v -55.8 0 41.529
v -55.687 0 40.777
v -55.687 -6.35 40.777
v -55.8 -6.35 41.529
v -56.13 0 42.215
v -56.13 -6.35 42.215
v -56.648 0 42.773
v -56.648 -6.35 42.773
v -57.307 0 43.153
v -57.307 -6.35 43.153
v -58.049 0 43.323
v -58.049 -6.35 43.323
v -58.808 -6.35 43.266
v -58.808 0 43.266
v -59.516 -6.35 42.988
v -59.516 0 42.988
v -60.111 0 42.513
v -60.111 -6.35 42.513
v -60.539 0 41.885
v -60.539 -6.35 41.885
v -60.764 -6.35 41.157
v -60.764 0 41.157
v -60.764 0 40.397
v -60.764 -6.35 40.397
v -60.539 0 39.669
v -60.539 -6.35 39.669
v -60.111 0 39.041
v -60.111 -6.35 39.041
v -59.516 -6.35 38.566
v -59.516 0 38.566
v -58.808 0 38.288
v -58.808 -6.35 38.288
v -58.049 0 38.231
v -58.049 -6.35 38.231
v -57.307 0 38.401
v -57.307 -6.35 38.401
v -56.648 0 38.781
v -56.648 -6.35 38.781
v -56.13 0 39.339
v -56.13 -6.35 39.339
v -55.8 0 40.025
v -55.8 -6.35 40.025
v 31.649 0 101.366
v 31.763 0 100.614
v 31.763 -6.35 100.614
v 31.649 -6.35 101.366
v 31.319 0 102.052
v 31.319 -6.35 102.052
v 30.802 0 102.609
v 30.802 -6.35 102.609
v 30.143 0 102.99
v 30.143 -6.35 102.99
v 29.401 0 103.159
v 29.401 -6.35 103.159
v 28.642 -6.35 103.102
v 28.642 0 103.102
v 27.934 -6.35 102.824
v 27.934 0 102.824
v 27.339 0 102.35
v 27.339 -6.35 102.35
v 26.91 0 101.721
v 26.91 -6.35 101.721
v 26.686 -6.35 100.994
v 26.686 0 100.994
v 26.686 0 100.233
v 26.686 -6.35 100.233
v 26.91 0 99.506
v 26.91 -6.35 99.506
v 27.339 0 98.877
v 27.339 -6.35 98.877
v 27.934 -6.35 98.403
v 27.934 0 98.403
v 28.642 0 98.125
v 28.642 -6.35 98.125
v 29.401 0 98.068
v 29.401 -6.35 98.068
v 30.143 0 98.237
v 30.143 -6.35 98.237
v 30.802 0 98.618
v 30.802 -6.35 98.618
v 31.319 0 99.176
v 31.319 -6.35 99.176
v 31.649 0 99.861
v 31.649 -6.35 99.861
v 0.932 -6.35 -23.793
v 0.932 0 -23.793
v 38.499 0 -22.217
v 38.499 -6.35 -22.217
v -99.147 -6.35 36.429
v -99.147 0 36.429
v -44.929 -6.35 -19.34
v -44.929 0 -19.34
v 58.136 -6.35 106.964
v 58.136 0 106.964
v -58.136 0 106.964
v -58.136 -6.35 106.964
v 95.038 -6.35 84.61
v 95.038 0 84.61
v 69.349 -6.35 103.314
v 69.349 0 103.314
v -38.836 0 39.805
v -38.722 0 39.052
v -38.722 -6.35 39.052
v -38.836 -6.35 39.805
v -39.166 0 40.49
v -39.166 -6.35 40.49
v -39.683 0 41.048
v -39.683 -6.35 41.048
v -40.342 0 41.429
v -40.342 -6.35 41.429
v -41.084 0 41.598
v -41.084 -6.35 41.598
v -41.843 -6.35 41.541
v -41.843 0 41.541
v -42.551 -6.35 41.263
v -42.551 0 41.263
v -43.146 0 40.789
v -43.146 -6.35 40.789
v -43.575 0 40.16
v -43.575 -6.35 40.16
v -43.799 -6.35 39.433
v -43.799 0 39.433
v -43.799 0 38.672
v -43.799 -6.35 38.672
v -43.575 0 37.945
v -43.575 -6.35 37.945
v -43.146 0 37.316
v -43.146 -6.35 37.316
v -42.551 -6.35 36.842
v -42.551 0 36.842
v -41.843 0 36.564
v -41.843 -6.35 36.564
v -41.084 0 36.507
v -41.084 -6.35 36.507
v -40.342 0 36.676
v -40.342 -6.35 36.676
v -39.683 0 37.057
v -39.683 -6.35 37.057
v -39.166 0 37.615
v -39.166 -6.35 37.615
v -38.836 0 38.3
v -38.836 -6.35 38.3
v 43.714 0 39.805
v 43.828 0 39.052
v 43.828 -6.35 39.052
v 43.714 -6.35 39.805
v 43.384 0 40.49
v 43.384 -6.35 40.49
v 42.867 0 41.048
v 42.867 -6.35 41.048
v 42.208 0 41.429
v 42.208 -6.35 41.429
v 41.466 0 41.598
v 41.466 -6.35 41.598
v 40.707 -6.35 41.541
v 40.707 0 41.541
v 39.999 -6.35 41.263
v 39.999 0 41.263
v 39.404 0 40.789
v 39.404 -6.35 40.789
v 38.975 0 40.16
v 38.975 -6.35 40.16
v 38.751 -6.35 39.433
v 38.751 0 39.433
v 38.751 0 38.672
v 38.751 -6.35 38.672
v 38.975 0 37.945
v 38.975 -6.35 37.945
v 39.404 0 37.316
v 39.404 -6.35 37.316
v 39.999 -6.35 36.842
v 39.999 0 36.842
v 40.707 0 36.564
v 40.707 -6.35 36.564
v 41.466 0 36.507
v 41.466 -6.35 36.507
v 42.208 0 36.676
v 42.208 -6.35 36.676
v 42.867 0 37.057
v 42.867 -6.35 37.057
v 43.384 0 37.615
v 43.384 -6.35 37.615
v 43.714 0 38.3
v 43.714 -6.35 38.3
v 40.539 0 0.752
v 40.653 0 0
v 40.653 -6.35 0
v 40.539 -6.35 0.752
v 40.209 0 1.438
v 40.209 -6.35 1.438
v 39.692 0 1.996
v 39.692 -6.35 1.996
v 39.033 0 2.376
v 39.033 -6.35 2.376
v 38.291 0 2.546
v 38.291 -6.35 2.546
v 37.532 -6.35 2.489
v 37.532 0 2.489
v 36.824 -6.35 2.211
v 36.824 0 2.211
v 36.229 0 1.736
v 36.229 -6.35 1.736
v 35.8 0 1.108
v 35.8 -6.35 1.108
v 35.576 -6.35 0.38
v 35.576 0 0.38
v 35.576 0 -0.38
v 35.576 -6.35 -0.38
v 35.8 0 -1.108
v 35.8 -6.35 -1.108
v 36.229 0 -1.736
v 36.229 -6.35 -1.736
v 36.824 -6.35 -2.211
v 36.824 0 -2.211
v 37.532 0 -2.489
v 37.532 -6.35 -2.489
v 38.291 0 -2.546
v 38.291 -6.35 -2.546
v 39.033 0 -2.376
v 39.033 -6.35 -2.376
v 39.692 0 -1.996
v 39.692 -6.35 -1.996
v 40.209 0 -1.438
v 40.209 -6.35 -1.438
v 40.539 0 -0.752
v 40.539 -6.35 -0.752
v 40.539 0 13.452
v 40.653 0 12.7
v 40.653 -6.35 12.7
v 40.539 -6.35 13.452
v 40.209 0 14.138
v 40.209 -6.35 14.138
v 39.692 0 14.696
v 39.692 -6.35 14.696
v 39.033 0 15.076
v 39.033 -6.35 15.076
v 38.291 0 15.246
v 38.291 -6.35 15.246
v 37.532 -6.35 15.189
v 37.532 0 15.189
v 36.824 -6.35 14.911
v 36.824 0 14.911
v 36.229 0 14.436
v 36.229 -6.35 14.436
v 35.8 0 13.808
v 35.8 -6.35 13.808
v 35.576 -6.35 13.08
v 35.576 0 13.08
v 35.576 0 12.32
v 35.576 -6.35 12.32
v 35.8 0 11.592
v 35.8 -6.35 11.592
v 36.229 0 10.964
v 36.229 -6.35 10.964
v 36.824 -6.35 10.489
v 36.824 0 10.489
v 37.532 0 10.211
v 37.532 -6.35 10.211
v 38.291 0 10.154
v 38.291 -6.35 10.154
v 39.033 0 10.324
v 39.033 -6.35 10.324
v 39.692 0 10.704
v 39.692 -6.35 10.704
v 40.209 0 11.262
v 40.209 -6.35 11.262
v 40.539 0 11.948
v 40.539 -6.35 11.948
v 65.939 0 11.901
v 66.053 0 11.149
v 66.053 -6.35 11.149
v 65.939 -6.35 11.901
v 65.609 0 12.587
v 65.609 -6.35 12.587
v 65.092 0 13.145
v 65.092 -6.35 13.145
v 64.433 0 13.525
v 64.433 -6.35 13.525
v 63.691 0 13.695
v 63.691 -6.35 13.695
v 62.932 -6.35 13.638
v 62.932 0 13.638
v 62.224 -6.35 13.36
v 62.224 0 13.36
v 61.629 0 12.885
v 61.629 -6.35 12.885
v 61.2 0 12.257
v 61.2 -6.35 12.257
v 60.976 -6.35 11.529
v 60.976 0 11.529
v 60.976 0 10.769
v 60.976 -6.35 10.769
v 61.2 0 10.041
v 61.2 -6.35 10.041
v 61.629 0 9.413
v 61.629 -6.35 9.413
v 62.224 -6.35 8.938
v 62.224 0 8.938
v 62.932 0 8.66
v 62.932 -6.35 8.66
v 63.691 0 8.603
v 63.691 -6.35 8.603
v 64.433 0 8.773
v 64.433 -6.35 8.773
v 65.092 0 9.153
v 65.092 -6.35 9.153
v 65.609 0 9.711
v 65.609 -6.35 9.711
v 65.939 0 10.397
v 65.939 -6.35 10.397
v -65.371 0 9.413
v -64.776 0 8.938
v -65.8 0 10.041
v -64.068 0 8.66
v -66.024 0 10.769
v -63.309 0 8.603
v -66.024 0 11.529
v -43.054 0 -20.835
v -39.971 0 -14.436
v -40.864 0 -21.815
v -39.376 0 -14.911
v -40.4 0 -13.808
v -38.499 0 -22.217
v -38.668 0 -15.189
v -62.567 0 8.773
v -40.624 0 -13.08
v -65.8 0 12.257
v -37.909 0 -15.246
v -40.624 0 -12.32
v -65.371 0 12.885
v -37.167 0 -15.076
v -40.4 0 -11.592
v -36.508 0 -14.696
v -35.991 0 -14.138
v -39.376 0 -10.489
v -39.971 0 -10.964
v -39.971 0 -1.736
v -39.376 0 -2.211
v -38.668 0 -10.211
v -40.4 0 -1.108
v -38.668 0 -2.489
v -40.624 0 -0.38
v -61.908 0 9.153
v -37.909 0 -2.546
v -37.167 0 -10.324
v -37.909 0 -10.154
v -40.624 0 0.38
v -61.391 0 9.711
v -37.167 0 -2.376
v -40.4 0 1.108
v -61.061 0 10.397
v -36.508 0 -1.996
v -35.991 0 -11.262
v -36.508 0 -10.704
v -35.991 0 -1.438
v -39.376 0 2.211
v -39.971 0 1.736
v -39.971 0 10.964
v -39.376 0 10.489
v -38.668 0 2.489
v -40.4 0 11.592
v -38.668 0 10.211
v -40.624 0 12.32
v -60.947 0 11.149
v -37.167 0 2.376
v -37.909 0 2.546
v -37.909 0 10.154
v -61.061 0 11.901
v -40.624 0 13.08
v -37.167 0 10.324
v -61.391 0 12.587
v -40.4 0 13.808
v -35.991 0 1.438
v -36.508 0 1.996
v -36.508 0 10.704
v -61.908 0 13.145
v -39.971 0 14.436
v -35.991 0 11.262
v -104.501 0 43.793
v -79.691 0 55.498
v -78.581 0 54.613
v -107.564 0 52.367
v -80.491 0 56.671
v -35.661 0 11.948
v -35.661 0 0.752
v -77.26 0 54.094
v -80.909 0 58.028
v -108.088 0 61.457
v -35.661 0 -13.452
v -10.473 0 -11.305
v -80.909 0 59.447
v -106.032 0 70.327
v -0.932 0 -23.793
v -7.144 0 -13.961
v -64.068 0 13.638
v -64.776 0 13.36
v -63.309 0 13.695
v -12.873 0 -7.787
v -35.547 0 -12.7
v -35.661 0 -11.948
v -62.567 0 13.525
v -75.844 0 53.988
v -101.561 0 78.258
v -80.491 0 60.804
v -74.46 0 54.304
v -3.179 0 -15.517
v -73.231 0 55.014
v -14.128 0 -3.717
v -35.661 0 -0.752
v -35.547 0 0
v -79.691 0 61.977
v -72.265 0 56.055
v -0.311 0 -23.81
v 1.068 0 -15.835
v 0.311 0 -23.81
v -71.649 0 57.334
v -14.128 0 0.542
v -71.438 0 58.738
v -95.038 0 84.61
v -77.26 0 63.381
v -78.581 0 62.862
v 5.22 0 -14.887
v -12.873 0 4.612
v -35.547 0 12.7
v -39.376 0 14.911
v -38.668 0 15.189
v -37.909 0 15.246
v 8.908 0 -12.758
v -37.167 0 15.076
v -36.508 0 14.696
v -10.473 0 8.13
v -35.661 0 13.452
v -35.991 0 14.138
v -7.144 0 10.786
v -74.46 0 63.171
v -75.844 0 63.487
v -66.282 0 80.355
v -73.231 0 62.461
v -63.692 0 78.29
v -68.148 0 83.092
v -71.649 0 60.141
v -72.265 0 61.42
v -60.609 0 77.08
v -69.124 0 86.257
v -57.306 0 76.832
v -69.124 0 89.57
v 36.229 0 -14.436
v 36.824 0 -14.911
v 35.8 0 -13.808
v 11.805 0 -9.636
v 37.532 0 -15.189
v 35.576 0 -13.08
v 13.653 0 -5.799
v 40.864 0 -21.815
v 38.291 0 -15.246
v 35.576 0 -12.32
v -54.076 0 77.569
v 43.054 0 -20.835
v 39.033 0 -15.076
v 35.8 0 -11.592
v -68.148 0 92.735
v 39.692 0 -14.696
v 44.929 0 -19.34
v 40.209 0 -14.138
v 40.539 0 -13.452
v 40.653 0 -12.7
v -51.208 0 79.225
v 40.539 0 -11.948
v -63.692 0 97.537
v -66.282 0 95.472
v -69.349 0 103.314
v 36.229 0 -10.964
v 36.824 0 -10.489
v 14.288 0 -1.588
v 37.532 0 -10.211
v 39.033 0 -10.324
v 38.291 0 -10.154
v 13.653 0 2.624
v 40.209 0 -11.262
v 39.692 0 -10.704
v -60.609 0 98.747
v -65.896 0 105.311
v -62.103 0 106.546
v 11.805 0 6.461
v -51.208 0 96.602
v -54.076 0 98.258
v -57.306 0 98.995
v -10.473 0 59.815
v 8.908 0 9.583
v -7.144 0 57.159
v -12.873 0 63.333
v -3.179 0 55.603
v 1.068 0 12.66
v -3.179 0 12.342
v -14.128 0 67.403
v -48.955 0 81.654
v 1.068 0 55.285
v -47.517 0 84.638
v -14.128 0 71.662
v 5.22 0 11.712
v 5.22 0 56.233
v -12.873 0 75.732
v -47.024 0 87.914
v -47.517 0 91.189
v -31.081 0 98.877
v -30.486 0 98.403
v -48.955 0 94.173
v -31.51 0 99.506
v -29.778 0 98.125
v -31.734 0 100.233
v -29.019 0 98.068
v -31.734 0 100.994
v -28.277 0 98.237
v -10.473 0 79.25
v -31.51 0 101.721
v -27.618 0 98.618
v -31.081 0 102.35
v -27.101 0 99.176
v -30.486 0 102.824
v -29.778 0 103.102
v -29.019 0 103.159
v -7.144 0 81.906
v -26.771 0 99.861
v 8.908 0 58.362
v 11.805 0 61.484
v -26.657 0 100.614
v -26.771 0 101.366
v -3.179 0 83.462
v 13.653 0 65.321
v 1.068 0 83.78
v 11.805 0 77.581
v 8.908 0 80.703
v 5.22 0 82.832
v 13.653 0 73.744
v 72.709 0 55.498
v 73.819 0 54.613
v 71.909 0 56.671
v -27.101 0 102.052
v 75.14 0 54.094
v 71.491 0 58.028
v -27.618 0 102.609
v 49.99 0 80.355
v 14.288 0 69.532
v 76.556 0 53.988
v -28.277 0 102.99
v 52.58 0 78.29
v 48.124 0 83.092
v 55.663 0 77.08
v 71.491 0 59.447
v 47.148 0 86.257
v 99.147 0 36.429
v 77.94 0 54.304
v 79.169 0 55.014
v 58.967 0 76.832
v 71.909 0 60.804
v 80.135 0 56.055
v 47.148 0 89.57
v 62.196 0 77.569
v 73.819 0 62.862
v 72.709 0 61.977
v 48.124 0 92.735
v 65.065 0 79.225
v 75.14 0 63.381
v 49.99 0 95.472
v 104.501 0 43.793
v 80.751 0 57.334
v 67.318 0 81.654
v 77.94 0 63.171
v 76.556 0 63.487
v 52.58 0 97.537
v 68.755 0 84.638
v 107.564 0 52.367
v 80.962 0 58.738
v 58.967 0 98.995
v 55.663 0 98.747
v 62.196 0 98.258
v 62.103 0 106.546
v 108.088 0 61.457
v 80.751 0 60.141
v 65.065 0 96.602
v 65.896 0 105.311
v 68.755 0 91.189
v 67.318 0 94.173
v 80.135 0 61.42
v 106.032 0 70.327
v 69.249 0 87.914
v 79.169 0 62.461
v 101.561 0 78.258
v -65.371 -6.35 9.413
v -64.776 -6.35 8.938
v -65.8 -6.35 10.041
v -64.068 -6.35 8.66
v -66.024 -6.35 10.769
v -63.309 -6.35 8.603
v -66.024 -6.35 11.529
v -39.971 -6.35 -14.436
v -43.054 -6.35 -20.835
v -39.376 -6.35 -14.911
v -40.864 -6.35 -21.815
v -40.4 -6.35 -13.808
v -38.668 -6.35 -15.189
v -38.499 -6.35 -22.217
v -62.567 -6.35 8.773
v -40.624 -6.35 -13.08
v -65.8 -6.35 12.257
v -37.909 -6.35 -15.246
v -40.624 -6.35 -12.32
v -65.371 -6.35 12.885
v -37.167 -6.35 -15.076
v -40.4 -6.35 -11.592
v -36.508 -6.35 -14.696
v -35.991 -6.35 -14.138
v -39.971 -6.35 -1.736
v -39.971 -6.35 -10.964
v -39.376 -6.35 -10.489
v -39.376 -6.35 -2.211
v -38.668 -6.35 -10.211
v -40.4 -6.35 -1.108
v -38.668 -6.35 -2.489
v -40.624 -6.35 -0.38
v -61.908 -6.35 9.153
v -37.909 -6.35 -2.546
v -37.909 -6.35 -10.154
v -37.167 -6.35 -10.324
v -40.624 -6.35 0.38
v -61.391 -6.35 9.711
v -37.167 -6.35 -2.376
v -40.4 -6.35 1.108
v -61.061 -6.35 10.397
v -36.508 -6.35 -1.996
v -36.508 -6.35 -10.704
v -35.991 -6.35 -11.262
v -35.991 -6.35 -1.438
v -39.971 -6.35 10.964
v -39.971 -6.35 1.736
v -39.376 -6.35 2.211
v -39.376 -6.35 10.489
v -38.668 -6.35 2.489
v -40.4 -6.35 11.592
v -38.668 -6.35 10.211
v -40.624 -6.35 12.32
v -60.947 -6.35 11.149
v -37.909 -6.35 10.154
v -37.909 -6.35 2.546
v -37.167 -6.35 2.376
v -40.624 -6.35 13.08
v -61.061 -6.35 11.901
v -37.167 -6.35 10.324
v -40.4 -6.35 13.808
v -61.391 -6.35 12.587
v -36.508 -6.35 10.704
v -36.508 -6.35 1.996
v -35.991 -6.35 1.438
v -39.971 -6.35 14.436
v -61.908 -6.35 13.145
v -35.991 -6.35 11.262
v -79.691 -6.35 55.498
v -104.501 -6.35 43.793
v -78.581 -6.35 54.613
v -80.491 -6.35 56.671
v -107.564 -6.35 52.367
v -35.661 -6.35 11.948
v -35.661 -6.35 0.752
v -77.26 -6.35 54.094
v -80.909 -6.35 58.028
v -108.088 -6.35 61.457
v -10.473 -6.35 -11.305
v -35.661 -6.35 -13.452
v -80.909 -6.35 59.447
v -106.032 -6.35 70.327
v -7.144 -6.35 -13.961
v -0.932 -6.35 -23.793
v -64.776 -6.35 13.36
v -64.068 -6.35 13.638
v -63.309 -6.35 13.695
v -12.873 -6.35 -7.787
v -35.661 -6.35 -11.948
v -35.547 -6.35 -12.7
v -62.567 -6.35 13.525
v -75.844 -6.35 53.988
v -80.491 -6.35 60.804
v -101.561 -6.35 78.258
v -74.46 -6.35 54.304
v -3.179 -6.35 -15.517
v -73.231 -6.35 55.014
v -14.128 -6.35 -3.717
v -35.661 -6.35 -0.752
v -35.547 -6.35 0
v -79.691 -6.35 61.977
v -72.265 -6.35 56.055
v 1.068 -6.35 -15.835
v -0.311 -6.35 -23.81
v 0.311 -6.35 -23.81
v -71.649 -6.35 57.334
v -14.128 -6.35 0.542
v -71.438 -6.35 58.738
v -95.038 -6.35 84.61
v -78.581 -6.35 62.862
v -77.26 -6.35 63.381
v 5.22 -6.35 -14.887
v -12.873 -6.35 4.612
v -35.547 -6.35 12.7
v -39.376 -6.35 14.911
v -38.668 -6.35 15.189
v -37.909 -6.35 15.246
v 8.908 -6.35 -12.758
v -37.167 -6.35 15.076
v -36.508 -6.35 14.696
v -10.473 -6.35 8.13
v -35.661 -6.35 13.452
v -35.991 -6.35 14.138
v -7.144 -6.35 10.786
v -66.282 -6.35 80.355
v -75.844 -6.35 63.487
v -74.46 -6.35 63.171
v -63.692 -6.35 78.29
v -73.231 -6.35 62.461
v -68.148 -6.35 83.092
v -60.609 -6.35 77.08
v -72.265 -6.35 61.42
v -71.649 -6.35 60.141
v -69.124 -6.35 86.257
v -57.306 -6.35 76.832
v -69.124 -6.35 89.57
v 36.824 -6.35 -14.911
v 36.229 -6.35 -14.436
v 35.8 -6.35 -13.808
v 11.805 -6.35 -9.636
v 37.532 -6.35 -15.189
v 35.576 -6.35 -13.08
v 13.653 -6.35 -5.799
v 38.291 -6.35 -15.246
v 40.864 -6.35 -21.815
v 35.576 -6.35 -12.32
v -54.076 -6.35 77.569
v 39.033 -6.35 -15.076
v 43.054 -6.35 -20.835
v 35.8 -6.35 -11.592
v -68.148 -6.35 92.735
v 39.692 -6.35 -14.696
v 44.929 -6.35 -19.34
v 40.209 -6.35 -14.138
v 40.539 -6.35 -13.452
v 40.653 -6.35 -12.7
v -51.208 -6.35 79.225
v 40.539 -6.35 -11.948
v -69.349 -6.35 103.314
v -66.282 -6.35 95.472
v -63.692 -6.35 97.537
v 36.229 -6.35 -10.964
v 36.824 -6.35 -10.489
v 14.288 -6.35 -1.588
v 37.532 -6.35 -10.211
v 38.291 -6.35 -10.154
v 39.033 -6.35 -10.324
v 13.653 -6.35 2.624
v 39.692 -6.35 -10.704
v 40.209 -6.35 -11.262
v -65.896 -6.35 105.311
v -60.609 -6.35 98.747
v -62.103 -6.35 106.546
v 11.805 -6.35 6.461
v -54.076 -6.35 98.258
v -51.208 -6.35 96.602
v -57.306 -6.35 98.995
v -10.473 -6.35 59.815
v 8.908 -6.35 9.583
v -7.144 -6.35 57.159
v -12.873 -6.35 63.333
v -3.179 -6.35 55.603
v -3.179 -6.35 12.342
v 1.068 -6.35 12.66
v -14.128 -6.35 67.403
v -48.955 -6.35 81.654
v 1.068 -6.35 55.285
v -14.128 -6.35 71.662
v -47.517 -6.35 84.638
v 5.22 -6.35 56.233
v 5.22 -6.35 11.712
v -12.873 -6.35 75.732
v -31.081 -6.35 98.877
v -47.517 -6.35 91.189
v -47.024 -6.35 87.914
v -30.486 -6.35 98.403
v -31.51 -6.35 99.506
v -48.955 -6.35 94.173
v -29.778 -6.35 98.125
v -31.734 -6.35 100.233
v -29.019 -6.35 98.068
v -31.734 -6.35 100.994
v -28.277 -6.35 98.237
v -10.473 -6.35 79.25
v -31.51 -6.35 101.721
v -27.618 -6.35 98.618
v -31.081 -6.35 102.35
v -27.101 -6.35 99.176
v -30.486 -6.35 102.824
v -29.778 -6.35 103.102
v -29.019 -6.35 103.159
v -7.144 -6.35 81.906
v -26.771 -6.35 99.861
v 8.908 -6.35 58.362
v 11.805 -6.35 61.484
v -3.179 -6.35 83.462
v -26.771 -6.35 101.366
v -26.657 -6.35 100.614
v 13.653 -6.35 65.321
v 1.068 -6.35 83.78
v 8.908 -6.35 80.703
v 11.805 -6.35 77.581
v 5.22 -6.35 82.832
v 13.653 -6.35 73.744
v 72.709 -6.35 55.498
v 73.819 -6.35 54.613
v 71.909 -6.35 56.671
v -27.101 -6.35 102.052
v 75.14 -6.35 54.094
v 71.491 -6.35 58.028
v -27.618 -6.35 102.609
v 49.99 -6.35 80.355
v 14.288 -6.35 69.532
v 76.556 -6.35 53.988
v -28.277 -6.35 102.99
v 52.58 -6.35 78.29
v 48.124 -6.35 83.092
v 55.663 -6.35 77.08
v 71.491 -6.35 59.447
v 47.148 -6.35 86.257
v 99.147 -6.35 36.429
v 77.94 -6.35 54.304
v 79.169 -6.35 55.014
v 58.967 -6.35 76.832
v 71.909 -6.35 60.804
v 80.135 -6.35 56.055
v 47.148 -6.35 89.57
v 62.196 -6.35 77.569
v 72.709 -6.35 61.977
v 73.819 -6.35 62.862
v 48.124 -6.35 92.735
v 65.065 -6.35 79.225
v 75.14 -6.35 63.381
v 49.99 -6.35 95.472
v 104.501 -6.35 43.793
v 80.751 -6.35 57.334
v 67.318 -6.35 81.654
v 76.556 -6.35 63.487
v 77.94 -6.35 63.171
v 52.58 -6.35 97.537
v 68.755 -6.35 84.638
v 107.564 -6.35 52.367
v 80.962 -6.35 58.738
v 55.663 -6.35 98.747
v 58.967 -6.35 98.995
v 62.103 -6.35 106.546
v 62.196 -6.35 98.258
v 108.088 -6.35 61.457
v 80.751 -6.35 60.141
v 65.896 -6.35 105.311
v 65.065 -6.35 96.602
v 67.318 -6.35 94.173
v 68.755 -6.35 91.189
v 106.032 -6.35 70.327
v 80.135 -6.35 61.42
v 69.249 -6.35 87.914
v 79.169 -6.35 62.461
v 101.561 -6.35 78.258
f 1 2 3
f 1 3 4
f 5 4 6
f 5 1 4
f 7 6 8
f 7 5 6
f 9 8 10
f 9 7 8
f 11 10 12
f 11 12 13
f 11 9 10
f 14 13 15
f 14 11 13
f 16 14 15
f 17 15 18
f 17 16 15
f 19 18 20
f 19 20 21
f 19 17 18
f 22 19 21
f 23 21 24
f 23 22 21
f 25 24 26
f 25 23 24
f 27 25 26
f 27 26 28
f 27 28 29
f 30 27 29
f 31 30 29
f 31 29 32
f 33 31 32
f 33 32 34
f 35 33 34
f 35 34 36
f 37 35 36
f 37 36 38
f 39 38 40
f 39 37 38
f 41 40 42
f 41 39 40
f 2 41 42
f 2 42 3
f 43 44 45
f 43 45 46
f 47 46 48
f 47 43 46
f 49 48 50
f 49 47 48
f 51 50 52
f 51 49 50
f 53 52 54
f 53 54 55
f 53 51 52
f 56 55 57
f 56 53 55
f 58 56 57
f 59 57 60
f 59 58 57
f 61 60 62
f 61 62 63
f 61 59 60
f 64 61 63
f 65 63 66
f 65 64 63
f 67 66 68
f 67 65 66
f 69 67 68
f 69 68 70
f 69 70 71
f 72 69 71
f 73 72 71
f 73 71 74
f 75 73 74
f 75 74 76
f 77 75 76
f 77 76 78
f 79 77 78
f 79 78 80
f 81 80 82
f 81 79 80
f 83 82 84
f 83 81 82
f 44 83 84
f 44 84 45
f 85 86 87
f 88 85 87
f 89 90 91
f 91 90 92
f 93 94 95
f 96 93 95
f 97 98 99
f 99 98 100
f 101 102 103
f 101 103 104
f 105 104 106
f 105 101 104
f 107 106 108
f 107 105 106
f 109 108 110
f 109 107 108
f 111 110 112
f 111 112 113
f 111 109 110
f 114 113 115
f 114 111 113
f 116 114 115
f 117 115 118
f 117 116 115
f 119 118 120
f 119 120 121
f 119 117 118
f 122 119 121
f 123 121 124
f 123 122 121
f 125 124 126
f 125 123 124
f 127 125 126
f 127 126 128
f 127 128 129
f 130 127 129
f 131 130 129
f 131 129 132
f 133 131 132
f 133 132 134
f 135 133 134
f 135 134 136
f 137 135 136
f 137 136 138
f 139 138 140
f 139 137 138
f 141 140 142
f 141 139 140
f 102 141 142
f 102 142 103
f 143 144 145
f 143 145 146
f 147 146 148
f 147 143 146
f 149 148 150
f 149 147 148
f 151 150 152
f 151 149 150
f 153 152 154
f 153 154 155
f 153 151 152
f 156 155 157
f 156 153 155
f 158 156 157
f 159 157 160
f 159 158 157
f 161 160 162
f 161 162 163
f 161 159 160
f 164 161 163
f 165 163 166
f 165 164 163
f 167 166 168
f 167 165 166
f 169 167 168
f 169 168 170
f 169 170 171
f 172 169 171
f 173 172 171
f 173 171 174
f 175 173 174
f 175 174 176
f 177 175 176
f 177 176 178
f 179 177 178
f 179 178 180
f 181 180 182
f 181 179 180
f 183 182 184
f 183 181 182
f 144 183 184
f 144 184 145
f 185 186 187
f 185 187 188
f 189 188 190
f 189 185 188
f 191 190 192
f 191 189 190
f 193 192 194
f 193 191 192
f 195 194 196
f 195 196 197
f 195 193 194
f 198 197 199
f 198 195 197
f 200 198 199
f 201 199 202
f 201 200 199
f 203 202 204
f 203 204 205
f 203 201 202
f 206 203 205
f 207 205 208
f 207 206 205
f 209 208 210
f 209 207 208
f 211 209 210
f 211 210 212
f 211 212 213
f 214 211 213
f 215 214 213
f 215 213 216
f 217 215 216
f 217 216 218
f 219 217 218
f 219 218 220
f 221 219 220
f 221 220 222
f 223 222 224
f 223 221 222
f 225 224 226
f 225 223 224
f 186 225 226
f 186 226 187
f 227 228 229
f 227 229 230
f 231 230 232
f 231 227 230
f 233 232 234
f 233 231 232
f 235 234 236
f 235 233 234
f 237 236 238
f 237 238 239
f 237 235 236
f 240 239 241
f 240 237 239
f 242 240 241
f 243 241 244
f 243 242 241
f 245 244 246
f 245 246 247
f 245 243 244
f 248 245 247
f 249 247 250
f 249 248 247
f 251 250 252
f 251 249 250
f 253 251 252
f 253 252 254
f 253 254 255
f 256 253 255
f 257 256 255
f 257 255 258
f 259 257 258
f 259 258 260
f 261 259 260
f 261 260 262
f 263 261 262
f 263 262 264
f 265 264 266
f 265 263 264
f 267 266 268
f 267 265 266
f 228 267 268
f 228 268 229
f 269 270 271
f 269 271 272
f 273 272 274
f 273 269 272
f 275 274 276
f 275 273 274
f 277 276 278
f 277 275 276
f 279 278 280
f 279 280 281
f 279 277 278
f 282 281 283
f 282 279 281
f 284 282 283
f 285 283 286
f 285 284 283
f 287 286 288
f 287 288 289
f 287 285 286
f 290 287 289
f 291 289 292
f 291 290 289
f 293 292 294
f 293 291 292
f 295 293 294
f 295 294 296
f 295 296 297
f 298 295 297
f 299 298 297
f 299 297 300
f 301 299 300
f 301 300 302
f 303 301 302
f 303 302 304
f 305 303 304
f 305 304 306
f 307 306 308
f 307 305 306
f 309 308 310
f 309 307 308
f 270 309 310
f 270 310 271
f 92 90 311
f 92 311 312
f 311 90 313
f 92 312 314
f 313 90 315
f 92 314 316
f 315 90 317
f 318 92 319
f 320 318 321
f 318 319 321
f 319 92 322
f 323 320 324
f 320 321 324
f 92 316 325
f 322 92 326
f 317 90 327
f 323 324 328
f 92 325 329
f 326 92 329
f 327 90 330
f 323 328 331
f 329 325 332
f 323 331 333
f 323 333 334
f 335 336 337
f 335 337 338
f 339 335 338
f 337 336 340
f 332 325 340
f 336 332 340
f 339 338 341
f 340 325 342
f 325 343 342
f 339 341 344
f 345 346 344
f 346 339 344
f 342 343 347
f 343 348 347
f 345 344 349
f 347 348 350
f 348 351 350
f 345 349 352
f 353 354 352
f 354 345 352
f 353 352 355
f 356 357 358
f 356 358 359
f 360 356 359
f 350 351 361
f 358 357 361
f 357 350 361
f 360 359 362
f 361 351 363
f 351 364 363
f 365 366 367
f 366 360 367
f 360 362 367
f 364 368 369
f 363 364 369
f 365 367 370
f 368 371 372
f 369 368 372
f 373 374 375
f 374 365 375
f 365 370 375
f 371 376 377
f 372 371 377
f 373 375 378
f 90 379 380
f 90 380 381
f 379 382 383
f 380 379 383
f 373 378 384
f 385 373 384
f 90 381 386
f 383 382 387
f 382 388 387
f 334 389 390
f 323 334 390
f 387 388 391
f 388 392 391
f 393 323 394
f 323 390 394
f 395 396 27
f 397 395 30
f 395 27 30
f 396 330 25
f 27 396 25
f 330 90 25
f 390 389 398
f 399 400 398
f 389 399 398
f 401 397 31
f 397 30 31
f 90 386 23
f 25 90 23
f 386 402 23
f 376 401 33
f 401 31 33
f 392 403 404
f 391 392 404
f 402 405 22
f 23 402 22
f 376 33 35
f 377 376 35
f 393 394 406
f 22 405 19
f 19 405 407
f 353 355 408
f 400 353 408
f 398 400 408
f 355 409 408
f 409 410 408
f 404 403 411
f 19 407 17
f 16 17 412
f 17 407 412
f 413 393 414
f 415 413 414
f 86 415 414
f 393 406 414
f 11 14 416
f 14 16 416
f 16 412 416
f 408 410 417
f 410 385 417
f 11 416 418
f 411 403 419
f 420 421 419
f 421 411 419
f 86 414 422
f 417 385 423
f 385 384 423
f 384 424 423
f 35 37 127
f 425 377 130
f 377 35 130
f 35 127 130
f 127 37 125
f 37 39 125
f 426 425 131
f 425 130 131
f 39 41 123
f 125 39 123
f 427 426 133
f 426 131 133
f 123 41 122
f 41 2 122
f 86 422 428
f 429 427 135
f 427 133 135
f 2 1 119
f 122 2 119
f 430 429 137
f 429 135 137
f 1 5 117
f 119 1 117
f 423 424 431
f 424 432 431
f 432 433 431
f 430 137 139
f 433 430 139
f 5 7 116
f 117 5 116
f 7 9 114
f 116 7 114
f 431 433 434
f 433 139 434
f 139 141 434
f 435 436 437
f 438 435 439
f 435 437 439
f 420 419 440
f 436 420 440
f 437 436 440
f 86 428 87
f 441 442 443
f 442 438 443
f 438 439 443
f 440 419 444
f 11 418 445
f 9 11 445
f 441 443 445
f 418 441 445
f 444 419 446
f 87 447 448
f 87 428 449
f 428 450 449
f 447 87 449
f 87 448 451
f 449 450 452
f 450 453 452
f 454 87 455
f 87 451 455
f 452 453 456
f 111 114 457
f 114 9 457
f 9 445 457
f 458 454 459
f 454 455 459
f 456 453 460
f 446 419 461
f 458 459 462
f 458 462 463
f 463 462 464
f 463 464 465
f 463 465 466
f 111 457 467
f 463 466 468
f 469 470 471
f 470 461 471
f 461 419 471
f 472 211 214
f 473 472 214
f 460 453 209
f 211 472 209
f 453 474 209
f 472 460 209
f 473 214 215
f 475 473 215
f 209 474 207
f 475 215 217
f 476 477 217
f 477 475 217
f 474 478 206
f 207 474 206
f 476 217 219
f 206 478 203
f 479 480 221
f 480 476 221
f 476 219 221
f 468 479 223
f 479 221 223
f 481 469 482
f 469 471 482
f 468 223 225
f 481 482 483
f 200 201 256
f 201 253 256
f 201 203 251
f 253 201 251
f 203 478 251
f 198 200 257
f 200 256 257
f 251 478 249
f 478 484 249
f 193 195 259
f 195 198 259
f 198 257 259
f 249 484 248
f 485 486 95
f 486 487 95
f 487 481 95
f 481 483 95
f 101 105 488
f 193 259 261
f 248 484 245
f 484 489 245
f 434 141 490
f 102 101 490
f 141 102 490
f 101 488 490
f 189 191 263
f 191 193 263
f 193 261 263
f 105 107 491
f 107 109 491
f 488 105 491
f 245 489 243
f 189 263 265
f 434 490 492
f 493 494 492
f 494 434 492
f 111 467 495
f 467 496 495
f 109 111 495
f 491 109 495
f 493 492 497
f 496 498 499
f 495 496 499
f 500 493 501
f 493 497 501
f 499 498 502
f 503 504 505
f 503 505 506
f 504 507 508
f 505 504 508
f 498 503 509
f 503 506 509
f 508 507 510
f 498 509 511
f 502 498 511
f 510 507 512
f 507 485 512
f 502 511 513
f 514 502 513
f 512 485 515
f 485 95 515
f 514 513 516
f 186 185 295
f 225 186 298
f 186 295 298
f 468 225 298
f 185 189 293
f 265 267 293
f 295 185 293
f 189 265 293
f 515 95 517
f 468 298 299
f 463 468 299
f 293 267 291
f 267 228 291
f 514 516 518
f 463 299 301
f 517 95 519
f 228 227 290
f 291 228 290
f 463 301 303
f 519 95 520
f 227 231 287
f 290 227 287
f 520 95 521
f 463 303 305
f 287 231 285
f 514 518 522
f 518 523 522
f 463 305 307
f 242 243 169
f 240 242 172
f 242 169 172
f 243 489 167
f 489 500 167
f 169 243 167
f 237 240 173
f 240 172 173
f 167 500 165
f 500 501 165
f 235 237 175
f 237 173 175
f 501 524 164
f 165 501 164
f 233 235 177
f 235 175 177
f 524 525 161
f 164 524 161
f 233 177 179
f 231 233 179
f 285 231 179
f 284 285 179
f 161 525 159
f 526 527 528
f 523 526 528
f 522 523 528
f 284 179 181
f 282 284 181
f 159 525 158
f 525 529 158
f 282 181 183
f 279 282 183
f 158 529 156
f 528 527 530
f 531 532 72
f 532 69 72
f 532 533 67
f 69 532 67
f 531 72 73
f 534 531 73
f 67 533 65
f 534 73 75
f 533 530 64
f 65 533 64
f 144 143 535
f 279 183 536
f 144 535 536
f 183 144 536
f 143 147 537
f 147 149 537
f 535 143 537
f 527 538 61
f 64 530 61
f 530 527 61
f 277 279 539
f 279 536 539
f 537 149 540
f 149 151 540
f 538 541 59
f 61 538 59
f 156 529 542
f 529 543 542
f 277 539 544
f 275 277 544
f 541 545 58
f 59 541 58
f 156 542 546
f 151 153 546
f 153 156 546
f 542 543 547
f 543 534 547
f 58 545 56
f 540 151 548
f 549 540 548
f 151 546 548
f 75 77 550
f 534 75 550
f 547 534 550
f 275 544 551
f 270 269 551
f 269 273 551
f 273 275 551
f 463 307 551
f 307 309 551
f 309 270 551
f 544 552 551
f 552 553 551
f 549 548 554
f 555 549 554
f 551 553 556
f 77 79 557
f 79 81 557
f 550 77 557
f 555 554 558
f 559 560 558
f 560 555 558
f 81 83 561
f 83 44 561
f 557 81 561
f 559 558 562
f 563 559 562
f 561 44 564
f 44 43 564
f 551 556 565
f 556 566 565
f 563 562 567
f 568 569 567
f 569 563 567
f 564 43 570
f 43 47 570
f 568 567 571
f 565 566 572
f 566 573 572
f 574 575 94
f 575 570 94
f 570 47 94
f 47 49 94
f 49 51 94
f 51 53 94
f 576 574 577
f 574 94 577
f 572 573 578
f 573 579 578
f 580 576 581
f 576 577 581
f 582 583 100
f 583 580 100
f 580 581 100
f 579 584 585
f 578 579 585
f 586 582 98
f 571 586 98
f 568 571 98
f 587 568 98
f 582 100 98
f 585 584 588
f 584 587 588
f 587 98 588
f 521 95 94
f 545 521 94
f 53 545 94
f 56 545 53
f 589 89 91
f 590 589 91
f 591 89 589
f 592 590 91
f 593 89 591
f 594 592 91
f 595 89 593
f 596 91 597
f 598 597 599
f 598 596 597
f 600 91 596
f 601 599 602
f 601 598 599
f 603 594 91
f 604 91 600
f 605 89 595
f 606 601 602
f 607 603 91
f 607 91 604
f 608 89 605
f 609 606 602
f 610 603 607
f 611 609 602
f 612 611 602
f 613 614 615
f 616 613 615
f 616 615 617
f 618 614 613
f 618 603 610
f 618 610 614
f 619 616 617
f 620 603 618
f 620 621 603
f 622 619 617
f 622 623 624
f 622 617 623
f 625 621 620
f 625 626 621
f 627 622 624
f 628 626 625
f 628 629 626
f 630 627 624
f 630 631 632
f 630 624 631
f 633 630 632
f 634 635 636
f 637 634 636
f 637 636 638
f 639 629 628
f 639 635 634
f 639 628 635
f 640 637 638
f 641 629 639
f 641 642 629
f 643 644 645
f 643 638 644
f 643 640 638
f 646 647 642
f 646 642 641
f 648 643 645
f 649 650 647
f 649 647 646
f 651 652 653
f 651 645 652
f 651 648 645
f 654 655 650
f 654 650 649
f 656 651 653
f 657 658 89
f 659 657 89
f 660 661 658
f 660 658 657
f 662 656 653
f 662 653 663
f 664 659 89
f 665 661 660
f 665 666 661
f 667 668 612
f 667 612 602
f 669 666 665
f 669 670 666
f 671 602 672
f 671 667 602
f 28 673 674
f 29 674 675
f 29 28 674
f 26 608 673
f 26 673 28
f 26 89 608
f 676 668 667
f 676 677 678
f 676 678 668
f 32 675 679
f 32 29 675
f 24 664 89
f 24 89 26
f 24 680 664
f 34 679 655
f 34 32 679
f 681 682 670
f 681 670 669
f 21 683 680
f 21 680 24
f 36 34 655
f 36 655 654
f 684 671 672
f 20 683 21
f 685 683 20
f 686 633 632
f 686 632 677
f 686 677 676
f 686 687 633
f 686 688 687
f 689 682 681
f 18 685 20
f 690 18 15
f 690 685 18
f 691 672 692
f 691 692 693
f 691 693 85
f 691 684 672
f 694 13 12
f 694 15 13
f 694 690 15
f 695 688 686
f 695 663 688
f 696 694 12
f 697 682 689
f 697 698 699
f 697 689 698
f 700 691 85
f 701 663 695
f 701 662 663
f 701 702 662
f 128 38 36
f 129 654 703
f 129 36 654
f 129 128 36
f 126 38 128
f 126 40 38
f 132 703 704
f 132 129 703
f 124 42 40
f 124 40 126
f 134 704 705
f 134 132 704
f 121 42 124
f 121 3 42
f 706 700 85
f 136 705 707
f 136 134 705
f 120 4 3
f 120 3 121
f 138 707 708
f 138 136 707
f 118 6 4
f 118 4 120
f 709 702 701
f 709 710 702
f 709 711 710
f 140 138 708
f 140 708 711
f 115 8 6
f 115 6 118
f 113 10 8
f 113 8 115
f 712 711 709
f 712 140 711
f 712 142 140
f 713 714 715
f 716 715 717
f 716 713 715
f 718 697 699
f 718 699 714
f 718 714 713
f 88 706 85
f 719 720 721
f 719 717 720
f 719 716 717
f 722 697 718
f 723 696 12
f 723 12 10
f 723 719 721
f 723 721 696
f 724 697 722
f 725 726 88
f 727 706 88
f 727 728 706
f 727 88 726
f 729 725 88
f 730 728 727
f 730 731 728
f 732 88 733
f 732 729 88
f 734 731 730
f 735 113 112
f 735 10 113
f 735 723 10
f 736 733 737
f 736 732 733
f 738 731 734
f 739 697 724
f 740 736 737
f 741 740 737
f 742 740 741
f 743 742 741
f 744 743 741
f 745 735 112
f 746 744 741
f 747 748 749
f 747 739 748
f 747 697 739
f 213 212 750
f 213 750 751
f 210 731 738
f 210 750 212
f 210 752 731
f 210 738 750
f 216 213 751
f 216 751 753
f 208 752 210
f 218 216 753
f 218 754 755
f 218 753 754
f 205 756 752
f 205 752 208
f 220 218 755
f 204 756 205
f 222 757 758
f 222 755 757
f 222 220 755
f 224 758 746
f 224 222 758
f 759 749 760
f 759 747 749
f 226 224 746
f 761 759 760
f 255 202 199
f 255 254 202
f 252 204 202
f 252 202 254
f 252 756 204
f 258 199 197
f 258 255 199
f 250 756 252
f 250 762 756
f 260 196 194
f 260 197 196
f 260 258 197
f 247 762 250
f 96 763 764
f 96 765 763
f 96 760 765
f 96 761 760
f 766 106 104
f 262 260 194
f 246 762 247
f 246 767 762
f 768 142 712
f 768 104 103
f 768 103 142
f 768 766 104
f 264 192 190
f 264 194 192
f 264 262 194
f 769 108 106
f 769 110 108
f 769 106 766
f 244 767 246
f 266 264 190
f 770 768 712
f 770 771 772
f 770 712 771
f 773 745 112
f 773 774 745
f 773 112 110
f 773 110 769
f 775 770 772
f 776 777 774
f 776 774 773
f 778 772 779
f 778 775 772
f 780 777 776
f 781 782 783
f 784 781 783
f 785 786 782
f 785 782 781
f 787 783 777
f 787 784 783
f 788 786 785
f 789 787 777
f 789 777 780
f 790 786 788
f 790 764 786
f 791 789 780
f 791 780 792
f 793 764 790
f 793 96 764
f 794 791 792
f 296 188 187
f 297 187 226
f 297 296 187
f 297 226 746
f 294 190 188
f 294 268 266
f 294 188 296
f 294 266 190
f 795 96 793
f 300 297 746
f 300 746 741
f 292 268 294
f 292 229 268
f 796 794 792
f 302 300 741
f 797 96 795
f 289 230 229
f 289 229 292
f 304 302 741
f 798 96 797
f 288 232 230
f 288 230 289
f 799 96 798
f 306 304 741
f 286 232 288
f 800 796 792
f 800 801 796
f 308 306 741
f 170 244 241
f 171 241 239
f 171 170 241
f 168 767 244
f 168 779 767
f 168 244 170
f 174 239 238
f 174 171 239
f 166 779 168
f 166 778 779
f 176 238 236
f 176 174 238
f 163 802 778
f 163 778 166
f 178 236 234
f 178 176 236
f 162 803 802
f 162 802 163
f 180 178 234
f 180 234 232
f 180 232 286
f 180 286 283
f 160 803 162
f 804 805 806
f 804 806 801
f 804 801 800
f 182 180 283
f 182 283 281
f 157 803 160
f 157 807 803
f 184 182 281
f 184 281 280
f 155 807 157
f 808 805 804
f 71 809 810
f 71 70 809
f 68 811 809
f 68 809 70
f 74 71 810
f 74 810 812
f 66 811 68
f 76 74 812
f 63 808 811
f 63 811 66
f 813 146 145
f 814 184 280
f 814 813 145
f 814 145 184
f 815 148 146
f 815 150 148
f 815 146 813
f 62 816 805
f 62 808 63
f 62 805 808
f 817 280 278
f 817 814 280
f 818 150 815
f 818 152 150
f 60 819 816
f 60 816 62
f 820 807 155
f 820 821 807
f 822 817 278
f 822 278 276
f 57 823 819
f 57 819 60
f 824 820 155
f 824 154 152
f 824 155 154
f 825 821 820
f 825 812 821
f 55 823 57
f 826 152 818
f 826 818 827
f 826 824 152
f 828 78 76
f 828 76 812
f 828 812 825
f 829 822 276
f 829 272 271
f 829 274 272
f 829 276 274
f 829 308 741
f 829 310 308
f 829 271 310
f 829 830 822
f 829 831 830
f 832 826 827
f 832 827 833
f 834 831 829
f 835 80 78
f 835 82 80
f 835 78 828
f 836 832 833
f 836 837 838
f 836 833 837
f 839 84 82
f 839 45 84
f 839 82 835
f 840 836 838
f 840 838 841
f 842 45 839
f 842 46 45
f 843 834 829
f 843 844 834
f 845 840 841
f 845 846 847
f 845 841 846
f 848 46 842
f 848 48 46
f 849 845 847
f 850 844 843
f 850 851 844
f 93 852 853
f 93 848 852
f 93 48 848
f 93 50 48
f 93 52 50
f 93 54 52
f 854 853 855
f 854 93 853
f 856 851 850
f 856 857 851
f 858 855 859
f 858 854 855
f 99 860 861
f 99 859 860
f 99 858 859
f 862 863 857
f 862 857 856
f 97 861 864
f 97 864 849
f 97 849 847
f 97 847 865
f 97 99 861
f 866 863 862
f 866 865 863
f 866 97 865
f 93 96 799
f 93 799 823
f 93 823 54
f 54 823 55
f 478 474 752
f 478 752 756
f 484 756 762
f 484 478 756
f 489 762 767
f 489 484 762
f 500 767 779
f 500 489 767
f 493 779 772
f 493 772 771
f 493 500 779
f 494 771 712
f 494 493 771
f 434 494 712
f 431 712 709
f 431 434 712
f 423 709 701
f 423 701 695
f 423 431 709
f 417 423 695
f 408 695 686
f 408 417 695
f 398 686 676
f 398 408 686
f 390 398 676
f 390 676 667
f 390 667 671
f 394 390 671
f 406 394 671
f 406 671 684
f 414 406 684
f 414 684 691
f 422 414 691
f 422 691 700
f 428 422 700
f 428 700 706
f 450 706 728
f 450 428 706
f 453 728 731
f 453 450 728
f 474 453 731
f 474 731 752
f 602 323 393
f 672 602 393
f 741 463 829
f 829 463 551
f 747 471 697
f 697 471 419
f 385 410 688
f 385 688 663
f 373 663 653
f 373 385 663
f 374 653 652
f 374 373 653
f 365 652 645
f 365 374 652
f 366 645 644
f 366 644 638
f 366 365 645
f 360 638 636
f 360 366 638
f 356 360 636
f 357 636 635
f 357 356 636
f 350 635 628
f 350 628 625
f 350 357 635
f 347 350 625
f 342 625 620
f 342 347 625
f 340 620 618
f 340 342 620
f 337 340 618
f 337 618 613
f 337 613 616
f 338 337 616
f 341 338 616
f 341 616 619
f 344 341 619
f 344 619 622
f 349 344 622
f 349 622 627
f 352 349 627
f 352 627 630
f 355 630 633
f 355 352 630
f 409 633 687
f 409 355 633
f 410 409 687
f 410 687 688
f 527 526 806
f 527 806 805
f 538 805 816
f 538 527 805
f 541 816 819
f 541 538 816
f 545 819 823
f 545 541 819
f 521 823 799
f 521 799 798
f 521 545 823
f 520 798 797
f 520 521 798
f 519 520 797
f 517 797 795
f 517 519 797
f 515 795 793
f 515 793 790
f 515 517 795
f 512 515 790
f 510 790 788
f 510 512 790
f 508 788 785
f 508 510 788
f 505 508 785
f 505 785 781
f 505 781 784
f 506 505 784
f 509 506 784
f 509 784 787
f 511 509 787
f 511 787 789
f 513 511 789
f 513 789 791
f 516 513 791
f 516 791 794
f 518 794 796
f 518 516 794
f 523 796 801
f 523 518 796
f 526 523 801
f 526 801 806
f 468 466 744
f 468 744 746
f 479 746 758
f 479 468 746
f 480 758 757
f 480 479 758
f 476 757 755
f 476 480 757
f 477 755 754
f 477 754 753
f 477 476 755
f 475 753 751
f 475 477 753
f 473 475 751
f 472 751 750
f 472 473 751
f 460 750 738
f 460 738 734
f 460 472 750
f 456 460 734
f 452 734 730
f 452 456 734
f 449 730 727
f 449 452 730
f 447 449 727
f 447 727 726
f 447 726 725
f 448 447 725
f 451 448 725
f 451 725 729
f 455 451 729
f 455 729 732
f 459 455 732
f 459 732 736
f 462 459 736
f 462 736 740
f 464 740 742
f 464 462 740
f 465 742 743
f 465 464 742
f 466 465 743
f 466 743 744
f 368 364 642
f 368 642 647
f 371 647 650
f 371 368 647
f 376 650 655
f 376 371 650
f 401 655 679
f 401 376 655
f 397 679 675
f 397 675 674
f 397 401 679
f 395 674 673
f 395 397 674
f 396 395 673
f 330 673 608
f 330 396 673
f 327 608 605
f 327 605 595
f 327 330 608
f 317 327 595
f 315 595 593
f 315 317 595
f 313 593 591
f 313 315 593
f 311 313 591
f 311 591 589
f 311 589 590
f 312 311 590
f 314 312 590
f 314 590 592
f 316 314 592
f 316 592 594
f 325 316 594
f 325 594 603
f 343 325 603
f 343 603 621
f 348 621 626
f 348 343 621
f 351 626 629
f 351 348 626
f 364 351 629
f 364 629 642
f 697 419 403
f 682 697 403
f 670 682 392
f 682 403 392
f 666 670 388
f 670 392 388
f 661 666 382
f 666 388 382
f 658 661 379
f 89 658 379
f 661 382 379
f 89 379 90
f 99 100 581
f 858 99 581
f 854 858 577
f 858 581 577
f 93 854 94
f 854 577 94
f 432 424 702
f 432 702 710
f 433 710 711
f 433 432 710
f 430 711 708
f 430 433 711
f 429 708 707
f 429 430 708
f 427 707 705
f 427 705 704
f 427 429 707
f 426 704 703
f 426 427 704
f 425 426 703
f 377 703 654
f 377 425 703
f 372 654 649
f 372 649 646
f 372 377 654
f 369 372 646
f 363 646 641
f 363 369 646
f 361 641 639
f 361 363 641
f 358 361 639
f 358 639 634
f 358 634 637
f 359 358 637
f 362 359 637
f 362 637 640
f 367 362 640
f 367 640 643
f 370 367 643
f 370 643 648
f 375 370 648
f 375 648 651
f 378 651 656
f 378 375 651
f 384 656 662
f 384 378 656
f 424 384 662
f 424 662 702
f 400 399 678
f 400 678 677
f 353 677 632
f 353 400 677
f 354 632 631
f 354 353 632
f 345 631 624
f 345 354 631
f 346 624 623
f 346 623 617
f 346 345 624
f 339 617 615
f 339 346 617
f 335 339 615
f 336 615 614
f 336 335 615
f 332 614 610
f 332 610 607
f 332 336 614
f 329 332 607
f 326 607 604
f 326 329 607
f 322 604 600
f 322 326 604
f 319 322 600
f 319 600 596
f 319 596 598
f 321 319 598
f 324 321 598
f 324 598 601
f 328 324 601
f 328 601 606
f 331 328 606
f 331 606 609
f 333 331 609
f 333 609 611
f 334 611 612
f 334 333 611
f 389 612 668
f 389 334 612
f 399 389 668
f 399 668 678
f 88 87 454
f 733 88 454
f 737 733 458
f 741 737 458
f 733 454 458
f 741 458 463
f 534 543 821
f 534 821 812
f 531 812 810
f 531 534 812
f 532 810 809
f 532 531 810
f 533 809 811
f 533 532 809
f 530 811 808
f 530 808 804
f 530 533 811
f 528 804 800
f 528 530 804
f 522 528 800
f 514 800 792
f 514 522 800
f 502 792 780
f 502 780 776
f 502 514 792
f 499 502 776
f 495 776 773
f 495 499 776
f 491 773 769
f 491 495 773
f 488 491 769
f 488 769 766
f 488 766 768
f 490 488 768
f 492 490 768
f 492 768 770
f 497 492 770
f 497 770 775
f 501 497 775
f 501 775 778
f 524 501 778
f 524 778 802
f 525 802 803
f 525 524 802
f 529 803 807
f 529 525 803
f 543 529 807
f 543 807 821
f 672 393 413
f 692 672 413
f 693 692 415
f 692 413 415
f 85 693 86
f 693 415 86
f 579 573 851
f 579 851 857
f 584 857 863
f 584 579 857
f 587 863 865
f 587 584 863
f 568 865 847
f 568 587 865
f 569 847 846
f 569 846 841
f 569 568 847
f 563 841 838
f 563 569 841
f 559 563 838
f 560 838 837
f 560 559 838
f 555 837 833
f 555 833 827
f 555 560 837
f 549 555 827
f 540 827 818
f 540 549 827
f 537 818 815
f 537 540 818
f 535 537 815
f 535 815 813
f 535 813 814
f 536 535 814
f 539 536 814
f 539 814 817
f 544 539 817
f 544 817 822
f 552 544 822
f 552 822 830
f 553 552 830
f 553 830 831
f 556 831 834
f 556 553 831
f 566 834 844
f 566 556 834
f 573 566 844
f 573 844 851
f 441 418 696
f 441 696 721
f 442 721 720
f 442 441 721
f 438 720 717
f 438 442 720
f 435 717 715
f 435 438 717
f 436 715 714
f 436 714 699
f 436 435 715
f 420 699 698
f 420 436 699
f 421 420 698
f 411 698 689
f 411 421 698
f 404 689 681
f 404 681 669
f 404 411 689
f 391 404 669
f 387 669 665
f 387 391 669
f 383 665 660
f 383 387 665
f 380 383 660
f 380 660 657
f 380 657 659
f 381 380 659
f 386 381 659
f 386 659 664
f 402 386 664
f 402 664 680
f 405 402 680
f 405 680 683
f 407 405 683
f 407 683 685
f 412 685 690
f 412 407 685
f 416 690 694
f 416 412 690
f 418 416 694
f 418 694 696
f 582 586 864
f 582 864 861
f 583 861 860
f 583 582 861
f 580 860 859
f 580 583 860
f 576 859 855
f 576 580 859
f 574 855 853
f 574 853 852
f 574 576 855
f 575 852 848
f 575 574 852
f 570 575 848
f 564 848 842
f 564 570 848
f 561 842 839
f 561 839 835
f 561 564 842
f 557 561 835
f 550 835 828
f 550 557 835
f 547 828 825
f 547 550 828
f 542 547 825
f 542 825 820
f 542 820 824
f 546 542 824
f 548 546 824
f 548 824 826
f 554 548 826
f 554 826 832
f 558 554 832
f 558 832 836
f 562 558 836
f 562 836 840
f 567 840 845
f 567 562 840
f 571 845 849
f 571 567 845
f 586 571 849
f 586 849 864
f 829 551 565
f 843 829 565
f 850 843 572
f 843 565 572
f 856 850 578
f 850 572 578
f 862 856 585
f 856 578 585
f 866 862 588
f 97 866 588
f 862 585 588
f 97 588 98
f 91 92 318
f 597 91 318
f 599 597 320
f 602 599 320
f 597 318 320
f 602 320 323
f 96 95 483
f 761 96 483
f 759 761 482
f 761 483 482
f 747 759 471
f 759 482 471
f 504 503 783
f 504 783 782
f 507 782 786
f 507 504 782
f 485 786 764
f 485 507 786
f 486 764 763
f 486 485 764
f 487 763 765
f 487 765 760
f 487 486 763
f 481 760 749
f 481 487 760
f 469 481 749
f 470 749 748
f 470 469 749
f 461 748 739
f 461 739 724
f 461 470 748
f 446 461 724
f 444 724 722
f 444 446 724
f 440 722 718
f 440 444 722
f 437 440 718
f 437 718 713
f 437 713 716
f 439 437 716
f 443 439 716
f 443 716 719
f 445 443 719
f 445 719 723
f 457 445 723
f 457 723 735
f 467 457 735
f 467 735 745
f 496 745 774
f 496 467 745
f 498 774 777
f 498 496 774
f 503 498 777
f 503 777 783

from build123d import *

# Parameters (mm, degrees)
F0_R     = 2.5527
F0_R_2   = 14.2875
F0_R_3   = 4.7625
F0_R_4   = 11.1125
F1_DEPTH = 6.35


with BuildPart() as f1:
    # F0 (on Front) → F1 (new body)
    with BuildSketch(Plane.XZ):
        with BuildLine():
            Line((-99.147001, 36.428507), (-44.929465, -19.339581))
            ThreePointArc((-44.929465, -19.339581), (-41.990137, -21.394392), (-38.499317, -22.216626))
            Line((-38.499317, -22.216626), (-0.931741, -23.792961))
            ThreePointArc((-0.931741, -23.792961), (0, -23.8125), (0.931741, -23.792961))
            Line((0.931741, -23.792961), (38.499317, -22.216626))
            ThreePointArc((38.499317, -22.216626), (41.990137, -21.394392), (44.929465, -19.339581))
            Line((44.929465, -19.339581), (99.147001, 36.428507))
            ThreePointArc((99.147001, 36.428507), (108.088235, 61.457145), (95.037742, 84.610178))
            Line((95.037742, 84.610178), (69.349048, 103.313963))
            ThreePointArc((69.349048, 103.313963), (64.032071, 106.028196), (58.136106, 106.963559))
            Line((58.136106, 106.963559), (-58.136106, 106.963559))
            ThreePointArc((-58.136106, 106.963559), (-64.032071, 106.028196), (-69.349048, 103.313963))
            Line((-69.349048, 103.313963), (-95.037742, 84.610178))
            ThreePointArc((-95.037742, 84.610178), (-108.088235, 61.457145), (-99.147001, 36.428507))
        make_face()
        with Locations((-38.1, -12.7)):
            Circle(F0_R, mode=Mode.SUBTRACT)
        with Locations((-38.1, 0)):
            Circle(F0_R, mode=Mode.SUBTRACT)
        with Locations((0, -1.5875)):
            Circle(F0_R_2, mode=Mode.SUBTRACT)
        with Locations((-63.5, 11.149014)):
            Circle(F0_R, mode=Mode.SUBTRACT)
        with Locations((-58.239488, 40.776988)):
            Circle(F0_R, mode=Mode.SUBTRACT)
        with Locations((-38.1, 12.7)):
            Circle(F0_R, mode=Mode.SUBTRACT)
        with Locations((-41.275, 39.0525)):
            Circle(F0_R, mode=Mode.SUBTRACT)
        with Locations((38.1, -12.7)):
            Circle(F0_R, mode=Mode.SUBTRACT)
        with Locations((38.1, 0)):
            Circle(F0_R, mode=Mode.SUBTRACT)
        with Locations((38.1, 12.7)):
            Circle(F0_R, mode=Mode.SUBTRACT)
        with Locations((41.275, 39.0525)):
            Circle(F0_R, mode=Mode.SUBTRACT)
        with Locations((63.5, 11.149014)):
            Circle(F0_R, mode=Mode.SUBTRACT)
        with Locations((-76.2, 58.7375)):
            Circle(F0_R_3, mode=Mode.SUBTRACT)
        with Locations((0, 69.5325)):
            Circle(F0_R_2, mode=Mode.SUBTRACT)
        with Locations((-58.136106, 87.913559)):
            Circle(F0_R_4, mode=Mode.SUBTRACT)
        with Locations((-29.21, 100.613559)):
            Circle(F0_R, mode=Mode.SUBTRACT)
        with Locations((76.2, 58.7375)):
            Circle(F0_R_3, mode=Mode.SUBTRACT)
        with Locations((29.21, 100.613559)):
            Circle(F0_R, mode=Mode.SUBTRACT)
        with Locations((58.136106, 87.913559)):
            Circle(F0_R_4, mode=Mode.SUBTRACT)
    extrude(amount=F1_DEPTH)


solid = f1.part
